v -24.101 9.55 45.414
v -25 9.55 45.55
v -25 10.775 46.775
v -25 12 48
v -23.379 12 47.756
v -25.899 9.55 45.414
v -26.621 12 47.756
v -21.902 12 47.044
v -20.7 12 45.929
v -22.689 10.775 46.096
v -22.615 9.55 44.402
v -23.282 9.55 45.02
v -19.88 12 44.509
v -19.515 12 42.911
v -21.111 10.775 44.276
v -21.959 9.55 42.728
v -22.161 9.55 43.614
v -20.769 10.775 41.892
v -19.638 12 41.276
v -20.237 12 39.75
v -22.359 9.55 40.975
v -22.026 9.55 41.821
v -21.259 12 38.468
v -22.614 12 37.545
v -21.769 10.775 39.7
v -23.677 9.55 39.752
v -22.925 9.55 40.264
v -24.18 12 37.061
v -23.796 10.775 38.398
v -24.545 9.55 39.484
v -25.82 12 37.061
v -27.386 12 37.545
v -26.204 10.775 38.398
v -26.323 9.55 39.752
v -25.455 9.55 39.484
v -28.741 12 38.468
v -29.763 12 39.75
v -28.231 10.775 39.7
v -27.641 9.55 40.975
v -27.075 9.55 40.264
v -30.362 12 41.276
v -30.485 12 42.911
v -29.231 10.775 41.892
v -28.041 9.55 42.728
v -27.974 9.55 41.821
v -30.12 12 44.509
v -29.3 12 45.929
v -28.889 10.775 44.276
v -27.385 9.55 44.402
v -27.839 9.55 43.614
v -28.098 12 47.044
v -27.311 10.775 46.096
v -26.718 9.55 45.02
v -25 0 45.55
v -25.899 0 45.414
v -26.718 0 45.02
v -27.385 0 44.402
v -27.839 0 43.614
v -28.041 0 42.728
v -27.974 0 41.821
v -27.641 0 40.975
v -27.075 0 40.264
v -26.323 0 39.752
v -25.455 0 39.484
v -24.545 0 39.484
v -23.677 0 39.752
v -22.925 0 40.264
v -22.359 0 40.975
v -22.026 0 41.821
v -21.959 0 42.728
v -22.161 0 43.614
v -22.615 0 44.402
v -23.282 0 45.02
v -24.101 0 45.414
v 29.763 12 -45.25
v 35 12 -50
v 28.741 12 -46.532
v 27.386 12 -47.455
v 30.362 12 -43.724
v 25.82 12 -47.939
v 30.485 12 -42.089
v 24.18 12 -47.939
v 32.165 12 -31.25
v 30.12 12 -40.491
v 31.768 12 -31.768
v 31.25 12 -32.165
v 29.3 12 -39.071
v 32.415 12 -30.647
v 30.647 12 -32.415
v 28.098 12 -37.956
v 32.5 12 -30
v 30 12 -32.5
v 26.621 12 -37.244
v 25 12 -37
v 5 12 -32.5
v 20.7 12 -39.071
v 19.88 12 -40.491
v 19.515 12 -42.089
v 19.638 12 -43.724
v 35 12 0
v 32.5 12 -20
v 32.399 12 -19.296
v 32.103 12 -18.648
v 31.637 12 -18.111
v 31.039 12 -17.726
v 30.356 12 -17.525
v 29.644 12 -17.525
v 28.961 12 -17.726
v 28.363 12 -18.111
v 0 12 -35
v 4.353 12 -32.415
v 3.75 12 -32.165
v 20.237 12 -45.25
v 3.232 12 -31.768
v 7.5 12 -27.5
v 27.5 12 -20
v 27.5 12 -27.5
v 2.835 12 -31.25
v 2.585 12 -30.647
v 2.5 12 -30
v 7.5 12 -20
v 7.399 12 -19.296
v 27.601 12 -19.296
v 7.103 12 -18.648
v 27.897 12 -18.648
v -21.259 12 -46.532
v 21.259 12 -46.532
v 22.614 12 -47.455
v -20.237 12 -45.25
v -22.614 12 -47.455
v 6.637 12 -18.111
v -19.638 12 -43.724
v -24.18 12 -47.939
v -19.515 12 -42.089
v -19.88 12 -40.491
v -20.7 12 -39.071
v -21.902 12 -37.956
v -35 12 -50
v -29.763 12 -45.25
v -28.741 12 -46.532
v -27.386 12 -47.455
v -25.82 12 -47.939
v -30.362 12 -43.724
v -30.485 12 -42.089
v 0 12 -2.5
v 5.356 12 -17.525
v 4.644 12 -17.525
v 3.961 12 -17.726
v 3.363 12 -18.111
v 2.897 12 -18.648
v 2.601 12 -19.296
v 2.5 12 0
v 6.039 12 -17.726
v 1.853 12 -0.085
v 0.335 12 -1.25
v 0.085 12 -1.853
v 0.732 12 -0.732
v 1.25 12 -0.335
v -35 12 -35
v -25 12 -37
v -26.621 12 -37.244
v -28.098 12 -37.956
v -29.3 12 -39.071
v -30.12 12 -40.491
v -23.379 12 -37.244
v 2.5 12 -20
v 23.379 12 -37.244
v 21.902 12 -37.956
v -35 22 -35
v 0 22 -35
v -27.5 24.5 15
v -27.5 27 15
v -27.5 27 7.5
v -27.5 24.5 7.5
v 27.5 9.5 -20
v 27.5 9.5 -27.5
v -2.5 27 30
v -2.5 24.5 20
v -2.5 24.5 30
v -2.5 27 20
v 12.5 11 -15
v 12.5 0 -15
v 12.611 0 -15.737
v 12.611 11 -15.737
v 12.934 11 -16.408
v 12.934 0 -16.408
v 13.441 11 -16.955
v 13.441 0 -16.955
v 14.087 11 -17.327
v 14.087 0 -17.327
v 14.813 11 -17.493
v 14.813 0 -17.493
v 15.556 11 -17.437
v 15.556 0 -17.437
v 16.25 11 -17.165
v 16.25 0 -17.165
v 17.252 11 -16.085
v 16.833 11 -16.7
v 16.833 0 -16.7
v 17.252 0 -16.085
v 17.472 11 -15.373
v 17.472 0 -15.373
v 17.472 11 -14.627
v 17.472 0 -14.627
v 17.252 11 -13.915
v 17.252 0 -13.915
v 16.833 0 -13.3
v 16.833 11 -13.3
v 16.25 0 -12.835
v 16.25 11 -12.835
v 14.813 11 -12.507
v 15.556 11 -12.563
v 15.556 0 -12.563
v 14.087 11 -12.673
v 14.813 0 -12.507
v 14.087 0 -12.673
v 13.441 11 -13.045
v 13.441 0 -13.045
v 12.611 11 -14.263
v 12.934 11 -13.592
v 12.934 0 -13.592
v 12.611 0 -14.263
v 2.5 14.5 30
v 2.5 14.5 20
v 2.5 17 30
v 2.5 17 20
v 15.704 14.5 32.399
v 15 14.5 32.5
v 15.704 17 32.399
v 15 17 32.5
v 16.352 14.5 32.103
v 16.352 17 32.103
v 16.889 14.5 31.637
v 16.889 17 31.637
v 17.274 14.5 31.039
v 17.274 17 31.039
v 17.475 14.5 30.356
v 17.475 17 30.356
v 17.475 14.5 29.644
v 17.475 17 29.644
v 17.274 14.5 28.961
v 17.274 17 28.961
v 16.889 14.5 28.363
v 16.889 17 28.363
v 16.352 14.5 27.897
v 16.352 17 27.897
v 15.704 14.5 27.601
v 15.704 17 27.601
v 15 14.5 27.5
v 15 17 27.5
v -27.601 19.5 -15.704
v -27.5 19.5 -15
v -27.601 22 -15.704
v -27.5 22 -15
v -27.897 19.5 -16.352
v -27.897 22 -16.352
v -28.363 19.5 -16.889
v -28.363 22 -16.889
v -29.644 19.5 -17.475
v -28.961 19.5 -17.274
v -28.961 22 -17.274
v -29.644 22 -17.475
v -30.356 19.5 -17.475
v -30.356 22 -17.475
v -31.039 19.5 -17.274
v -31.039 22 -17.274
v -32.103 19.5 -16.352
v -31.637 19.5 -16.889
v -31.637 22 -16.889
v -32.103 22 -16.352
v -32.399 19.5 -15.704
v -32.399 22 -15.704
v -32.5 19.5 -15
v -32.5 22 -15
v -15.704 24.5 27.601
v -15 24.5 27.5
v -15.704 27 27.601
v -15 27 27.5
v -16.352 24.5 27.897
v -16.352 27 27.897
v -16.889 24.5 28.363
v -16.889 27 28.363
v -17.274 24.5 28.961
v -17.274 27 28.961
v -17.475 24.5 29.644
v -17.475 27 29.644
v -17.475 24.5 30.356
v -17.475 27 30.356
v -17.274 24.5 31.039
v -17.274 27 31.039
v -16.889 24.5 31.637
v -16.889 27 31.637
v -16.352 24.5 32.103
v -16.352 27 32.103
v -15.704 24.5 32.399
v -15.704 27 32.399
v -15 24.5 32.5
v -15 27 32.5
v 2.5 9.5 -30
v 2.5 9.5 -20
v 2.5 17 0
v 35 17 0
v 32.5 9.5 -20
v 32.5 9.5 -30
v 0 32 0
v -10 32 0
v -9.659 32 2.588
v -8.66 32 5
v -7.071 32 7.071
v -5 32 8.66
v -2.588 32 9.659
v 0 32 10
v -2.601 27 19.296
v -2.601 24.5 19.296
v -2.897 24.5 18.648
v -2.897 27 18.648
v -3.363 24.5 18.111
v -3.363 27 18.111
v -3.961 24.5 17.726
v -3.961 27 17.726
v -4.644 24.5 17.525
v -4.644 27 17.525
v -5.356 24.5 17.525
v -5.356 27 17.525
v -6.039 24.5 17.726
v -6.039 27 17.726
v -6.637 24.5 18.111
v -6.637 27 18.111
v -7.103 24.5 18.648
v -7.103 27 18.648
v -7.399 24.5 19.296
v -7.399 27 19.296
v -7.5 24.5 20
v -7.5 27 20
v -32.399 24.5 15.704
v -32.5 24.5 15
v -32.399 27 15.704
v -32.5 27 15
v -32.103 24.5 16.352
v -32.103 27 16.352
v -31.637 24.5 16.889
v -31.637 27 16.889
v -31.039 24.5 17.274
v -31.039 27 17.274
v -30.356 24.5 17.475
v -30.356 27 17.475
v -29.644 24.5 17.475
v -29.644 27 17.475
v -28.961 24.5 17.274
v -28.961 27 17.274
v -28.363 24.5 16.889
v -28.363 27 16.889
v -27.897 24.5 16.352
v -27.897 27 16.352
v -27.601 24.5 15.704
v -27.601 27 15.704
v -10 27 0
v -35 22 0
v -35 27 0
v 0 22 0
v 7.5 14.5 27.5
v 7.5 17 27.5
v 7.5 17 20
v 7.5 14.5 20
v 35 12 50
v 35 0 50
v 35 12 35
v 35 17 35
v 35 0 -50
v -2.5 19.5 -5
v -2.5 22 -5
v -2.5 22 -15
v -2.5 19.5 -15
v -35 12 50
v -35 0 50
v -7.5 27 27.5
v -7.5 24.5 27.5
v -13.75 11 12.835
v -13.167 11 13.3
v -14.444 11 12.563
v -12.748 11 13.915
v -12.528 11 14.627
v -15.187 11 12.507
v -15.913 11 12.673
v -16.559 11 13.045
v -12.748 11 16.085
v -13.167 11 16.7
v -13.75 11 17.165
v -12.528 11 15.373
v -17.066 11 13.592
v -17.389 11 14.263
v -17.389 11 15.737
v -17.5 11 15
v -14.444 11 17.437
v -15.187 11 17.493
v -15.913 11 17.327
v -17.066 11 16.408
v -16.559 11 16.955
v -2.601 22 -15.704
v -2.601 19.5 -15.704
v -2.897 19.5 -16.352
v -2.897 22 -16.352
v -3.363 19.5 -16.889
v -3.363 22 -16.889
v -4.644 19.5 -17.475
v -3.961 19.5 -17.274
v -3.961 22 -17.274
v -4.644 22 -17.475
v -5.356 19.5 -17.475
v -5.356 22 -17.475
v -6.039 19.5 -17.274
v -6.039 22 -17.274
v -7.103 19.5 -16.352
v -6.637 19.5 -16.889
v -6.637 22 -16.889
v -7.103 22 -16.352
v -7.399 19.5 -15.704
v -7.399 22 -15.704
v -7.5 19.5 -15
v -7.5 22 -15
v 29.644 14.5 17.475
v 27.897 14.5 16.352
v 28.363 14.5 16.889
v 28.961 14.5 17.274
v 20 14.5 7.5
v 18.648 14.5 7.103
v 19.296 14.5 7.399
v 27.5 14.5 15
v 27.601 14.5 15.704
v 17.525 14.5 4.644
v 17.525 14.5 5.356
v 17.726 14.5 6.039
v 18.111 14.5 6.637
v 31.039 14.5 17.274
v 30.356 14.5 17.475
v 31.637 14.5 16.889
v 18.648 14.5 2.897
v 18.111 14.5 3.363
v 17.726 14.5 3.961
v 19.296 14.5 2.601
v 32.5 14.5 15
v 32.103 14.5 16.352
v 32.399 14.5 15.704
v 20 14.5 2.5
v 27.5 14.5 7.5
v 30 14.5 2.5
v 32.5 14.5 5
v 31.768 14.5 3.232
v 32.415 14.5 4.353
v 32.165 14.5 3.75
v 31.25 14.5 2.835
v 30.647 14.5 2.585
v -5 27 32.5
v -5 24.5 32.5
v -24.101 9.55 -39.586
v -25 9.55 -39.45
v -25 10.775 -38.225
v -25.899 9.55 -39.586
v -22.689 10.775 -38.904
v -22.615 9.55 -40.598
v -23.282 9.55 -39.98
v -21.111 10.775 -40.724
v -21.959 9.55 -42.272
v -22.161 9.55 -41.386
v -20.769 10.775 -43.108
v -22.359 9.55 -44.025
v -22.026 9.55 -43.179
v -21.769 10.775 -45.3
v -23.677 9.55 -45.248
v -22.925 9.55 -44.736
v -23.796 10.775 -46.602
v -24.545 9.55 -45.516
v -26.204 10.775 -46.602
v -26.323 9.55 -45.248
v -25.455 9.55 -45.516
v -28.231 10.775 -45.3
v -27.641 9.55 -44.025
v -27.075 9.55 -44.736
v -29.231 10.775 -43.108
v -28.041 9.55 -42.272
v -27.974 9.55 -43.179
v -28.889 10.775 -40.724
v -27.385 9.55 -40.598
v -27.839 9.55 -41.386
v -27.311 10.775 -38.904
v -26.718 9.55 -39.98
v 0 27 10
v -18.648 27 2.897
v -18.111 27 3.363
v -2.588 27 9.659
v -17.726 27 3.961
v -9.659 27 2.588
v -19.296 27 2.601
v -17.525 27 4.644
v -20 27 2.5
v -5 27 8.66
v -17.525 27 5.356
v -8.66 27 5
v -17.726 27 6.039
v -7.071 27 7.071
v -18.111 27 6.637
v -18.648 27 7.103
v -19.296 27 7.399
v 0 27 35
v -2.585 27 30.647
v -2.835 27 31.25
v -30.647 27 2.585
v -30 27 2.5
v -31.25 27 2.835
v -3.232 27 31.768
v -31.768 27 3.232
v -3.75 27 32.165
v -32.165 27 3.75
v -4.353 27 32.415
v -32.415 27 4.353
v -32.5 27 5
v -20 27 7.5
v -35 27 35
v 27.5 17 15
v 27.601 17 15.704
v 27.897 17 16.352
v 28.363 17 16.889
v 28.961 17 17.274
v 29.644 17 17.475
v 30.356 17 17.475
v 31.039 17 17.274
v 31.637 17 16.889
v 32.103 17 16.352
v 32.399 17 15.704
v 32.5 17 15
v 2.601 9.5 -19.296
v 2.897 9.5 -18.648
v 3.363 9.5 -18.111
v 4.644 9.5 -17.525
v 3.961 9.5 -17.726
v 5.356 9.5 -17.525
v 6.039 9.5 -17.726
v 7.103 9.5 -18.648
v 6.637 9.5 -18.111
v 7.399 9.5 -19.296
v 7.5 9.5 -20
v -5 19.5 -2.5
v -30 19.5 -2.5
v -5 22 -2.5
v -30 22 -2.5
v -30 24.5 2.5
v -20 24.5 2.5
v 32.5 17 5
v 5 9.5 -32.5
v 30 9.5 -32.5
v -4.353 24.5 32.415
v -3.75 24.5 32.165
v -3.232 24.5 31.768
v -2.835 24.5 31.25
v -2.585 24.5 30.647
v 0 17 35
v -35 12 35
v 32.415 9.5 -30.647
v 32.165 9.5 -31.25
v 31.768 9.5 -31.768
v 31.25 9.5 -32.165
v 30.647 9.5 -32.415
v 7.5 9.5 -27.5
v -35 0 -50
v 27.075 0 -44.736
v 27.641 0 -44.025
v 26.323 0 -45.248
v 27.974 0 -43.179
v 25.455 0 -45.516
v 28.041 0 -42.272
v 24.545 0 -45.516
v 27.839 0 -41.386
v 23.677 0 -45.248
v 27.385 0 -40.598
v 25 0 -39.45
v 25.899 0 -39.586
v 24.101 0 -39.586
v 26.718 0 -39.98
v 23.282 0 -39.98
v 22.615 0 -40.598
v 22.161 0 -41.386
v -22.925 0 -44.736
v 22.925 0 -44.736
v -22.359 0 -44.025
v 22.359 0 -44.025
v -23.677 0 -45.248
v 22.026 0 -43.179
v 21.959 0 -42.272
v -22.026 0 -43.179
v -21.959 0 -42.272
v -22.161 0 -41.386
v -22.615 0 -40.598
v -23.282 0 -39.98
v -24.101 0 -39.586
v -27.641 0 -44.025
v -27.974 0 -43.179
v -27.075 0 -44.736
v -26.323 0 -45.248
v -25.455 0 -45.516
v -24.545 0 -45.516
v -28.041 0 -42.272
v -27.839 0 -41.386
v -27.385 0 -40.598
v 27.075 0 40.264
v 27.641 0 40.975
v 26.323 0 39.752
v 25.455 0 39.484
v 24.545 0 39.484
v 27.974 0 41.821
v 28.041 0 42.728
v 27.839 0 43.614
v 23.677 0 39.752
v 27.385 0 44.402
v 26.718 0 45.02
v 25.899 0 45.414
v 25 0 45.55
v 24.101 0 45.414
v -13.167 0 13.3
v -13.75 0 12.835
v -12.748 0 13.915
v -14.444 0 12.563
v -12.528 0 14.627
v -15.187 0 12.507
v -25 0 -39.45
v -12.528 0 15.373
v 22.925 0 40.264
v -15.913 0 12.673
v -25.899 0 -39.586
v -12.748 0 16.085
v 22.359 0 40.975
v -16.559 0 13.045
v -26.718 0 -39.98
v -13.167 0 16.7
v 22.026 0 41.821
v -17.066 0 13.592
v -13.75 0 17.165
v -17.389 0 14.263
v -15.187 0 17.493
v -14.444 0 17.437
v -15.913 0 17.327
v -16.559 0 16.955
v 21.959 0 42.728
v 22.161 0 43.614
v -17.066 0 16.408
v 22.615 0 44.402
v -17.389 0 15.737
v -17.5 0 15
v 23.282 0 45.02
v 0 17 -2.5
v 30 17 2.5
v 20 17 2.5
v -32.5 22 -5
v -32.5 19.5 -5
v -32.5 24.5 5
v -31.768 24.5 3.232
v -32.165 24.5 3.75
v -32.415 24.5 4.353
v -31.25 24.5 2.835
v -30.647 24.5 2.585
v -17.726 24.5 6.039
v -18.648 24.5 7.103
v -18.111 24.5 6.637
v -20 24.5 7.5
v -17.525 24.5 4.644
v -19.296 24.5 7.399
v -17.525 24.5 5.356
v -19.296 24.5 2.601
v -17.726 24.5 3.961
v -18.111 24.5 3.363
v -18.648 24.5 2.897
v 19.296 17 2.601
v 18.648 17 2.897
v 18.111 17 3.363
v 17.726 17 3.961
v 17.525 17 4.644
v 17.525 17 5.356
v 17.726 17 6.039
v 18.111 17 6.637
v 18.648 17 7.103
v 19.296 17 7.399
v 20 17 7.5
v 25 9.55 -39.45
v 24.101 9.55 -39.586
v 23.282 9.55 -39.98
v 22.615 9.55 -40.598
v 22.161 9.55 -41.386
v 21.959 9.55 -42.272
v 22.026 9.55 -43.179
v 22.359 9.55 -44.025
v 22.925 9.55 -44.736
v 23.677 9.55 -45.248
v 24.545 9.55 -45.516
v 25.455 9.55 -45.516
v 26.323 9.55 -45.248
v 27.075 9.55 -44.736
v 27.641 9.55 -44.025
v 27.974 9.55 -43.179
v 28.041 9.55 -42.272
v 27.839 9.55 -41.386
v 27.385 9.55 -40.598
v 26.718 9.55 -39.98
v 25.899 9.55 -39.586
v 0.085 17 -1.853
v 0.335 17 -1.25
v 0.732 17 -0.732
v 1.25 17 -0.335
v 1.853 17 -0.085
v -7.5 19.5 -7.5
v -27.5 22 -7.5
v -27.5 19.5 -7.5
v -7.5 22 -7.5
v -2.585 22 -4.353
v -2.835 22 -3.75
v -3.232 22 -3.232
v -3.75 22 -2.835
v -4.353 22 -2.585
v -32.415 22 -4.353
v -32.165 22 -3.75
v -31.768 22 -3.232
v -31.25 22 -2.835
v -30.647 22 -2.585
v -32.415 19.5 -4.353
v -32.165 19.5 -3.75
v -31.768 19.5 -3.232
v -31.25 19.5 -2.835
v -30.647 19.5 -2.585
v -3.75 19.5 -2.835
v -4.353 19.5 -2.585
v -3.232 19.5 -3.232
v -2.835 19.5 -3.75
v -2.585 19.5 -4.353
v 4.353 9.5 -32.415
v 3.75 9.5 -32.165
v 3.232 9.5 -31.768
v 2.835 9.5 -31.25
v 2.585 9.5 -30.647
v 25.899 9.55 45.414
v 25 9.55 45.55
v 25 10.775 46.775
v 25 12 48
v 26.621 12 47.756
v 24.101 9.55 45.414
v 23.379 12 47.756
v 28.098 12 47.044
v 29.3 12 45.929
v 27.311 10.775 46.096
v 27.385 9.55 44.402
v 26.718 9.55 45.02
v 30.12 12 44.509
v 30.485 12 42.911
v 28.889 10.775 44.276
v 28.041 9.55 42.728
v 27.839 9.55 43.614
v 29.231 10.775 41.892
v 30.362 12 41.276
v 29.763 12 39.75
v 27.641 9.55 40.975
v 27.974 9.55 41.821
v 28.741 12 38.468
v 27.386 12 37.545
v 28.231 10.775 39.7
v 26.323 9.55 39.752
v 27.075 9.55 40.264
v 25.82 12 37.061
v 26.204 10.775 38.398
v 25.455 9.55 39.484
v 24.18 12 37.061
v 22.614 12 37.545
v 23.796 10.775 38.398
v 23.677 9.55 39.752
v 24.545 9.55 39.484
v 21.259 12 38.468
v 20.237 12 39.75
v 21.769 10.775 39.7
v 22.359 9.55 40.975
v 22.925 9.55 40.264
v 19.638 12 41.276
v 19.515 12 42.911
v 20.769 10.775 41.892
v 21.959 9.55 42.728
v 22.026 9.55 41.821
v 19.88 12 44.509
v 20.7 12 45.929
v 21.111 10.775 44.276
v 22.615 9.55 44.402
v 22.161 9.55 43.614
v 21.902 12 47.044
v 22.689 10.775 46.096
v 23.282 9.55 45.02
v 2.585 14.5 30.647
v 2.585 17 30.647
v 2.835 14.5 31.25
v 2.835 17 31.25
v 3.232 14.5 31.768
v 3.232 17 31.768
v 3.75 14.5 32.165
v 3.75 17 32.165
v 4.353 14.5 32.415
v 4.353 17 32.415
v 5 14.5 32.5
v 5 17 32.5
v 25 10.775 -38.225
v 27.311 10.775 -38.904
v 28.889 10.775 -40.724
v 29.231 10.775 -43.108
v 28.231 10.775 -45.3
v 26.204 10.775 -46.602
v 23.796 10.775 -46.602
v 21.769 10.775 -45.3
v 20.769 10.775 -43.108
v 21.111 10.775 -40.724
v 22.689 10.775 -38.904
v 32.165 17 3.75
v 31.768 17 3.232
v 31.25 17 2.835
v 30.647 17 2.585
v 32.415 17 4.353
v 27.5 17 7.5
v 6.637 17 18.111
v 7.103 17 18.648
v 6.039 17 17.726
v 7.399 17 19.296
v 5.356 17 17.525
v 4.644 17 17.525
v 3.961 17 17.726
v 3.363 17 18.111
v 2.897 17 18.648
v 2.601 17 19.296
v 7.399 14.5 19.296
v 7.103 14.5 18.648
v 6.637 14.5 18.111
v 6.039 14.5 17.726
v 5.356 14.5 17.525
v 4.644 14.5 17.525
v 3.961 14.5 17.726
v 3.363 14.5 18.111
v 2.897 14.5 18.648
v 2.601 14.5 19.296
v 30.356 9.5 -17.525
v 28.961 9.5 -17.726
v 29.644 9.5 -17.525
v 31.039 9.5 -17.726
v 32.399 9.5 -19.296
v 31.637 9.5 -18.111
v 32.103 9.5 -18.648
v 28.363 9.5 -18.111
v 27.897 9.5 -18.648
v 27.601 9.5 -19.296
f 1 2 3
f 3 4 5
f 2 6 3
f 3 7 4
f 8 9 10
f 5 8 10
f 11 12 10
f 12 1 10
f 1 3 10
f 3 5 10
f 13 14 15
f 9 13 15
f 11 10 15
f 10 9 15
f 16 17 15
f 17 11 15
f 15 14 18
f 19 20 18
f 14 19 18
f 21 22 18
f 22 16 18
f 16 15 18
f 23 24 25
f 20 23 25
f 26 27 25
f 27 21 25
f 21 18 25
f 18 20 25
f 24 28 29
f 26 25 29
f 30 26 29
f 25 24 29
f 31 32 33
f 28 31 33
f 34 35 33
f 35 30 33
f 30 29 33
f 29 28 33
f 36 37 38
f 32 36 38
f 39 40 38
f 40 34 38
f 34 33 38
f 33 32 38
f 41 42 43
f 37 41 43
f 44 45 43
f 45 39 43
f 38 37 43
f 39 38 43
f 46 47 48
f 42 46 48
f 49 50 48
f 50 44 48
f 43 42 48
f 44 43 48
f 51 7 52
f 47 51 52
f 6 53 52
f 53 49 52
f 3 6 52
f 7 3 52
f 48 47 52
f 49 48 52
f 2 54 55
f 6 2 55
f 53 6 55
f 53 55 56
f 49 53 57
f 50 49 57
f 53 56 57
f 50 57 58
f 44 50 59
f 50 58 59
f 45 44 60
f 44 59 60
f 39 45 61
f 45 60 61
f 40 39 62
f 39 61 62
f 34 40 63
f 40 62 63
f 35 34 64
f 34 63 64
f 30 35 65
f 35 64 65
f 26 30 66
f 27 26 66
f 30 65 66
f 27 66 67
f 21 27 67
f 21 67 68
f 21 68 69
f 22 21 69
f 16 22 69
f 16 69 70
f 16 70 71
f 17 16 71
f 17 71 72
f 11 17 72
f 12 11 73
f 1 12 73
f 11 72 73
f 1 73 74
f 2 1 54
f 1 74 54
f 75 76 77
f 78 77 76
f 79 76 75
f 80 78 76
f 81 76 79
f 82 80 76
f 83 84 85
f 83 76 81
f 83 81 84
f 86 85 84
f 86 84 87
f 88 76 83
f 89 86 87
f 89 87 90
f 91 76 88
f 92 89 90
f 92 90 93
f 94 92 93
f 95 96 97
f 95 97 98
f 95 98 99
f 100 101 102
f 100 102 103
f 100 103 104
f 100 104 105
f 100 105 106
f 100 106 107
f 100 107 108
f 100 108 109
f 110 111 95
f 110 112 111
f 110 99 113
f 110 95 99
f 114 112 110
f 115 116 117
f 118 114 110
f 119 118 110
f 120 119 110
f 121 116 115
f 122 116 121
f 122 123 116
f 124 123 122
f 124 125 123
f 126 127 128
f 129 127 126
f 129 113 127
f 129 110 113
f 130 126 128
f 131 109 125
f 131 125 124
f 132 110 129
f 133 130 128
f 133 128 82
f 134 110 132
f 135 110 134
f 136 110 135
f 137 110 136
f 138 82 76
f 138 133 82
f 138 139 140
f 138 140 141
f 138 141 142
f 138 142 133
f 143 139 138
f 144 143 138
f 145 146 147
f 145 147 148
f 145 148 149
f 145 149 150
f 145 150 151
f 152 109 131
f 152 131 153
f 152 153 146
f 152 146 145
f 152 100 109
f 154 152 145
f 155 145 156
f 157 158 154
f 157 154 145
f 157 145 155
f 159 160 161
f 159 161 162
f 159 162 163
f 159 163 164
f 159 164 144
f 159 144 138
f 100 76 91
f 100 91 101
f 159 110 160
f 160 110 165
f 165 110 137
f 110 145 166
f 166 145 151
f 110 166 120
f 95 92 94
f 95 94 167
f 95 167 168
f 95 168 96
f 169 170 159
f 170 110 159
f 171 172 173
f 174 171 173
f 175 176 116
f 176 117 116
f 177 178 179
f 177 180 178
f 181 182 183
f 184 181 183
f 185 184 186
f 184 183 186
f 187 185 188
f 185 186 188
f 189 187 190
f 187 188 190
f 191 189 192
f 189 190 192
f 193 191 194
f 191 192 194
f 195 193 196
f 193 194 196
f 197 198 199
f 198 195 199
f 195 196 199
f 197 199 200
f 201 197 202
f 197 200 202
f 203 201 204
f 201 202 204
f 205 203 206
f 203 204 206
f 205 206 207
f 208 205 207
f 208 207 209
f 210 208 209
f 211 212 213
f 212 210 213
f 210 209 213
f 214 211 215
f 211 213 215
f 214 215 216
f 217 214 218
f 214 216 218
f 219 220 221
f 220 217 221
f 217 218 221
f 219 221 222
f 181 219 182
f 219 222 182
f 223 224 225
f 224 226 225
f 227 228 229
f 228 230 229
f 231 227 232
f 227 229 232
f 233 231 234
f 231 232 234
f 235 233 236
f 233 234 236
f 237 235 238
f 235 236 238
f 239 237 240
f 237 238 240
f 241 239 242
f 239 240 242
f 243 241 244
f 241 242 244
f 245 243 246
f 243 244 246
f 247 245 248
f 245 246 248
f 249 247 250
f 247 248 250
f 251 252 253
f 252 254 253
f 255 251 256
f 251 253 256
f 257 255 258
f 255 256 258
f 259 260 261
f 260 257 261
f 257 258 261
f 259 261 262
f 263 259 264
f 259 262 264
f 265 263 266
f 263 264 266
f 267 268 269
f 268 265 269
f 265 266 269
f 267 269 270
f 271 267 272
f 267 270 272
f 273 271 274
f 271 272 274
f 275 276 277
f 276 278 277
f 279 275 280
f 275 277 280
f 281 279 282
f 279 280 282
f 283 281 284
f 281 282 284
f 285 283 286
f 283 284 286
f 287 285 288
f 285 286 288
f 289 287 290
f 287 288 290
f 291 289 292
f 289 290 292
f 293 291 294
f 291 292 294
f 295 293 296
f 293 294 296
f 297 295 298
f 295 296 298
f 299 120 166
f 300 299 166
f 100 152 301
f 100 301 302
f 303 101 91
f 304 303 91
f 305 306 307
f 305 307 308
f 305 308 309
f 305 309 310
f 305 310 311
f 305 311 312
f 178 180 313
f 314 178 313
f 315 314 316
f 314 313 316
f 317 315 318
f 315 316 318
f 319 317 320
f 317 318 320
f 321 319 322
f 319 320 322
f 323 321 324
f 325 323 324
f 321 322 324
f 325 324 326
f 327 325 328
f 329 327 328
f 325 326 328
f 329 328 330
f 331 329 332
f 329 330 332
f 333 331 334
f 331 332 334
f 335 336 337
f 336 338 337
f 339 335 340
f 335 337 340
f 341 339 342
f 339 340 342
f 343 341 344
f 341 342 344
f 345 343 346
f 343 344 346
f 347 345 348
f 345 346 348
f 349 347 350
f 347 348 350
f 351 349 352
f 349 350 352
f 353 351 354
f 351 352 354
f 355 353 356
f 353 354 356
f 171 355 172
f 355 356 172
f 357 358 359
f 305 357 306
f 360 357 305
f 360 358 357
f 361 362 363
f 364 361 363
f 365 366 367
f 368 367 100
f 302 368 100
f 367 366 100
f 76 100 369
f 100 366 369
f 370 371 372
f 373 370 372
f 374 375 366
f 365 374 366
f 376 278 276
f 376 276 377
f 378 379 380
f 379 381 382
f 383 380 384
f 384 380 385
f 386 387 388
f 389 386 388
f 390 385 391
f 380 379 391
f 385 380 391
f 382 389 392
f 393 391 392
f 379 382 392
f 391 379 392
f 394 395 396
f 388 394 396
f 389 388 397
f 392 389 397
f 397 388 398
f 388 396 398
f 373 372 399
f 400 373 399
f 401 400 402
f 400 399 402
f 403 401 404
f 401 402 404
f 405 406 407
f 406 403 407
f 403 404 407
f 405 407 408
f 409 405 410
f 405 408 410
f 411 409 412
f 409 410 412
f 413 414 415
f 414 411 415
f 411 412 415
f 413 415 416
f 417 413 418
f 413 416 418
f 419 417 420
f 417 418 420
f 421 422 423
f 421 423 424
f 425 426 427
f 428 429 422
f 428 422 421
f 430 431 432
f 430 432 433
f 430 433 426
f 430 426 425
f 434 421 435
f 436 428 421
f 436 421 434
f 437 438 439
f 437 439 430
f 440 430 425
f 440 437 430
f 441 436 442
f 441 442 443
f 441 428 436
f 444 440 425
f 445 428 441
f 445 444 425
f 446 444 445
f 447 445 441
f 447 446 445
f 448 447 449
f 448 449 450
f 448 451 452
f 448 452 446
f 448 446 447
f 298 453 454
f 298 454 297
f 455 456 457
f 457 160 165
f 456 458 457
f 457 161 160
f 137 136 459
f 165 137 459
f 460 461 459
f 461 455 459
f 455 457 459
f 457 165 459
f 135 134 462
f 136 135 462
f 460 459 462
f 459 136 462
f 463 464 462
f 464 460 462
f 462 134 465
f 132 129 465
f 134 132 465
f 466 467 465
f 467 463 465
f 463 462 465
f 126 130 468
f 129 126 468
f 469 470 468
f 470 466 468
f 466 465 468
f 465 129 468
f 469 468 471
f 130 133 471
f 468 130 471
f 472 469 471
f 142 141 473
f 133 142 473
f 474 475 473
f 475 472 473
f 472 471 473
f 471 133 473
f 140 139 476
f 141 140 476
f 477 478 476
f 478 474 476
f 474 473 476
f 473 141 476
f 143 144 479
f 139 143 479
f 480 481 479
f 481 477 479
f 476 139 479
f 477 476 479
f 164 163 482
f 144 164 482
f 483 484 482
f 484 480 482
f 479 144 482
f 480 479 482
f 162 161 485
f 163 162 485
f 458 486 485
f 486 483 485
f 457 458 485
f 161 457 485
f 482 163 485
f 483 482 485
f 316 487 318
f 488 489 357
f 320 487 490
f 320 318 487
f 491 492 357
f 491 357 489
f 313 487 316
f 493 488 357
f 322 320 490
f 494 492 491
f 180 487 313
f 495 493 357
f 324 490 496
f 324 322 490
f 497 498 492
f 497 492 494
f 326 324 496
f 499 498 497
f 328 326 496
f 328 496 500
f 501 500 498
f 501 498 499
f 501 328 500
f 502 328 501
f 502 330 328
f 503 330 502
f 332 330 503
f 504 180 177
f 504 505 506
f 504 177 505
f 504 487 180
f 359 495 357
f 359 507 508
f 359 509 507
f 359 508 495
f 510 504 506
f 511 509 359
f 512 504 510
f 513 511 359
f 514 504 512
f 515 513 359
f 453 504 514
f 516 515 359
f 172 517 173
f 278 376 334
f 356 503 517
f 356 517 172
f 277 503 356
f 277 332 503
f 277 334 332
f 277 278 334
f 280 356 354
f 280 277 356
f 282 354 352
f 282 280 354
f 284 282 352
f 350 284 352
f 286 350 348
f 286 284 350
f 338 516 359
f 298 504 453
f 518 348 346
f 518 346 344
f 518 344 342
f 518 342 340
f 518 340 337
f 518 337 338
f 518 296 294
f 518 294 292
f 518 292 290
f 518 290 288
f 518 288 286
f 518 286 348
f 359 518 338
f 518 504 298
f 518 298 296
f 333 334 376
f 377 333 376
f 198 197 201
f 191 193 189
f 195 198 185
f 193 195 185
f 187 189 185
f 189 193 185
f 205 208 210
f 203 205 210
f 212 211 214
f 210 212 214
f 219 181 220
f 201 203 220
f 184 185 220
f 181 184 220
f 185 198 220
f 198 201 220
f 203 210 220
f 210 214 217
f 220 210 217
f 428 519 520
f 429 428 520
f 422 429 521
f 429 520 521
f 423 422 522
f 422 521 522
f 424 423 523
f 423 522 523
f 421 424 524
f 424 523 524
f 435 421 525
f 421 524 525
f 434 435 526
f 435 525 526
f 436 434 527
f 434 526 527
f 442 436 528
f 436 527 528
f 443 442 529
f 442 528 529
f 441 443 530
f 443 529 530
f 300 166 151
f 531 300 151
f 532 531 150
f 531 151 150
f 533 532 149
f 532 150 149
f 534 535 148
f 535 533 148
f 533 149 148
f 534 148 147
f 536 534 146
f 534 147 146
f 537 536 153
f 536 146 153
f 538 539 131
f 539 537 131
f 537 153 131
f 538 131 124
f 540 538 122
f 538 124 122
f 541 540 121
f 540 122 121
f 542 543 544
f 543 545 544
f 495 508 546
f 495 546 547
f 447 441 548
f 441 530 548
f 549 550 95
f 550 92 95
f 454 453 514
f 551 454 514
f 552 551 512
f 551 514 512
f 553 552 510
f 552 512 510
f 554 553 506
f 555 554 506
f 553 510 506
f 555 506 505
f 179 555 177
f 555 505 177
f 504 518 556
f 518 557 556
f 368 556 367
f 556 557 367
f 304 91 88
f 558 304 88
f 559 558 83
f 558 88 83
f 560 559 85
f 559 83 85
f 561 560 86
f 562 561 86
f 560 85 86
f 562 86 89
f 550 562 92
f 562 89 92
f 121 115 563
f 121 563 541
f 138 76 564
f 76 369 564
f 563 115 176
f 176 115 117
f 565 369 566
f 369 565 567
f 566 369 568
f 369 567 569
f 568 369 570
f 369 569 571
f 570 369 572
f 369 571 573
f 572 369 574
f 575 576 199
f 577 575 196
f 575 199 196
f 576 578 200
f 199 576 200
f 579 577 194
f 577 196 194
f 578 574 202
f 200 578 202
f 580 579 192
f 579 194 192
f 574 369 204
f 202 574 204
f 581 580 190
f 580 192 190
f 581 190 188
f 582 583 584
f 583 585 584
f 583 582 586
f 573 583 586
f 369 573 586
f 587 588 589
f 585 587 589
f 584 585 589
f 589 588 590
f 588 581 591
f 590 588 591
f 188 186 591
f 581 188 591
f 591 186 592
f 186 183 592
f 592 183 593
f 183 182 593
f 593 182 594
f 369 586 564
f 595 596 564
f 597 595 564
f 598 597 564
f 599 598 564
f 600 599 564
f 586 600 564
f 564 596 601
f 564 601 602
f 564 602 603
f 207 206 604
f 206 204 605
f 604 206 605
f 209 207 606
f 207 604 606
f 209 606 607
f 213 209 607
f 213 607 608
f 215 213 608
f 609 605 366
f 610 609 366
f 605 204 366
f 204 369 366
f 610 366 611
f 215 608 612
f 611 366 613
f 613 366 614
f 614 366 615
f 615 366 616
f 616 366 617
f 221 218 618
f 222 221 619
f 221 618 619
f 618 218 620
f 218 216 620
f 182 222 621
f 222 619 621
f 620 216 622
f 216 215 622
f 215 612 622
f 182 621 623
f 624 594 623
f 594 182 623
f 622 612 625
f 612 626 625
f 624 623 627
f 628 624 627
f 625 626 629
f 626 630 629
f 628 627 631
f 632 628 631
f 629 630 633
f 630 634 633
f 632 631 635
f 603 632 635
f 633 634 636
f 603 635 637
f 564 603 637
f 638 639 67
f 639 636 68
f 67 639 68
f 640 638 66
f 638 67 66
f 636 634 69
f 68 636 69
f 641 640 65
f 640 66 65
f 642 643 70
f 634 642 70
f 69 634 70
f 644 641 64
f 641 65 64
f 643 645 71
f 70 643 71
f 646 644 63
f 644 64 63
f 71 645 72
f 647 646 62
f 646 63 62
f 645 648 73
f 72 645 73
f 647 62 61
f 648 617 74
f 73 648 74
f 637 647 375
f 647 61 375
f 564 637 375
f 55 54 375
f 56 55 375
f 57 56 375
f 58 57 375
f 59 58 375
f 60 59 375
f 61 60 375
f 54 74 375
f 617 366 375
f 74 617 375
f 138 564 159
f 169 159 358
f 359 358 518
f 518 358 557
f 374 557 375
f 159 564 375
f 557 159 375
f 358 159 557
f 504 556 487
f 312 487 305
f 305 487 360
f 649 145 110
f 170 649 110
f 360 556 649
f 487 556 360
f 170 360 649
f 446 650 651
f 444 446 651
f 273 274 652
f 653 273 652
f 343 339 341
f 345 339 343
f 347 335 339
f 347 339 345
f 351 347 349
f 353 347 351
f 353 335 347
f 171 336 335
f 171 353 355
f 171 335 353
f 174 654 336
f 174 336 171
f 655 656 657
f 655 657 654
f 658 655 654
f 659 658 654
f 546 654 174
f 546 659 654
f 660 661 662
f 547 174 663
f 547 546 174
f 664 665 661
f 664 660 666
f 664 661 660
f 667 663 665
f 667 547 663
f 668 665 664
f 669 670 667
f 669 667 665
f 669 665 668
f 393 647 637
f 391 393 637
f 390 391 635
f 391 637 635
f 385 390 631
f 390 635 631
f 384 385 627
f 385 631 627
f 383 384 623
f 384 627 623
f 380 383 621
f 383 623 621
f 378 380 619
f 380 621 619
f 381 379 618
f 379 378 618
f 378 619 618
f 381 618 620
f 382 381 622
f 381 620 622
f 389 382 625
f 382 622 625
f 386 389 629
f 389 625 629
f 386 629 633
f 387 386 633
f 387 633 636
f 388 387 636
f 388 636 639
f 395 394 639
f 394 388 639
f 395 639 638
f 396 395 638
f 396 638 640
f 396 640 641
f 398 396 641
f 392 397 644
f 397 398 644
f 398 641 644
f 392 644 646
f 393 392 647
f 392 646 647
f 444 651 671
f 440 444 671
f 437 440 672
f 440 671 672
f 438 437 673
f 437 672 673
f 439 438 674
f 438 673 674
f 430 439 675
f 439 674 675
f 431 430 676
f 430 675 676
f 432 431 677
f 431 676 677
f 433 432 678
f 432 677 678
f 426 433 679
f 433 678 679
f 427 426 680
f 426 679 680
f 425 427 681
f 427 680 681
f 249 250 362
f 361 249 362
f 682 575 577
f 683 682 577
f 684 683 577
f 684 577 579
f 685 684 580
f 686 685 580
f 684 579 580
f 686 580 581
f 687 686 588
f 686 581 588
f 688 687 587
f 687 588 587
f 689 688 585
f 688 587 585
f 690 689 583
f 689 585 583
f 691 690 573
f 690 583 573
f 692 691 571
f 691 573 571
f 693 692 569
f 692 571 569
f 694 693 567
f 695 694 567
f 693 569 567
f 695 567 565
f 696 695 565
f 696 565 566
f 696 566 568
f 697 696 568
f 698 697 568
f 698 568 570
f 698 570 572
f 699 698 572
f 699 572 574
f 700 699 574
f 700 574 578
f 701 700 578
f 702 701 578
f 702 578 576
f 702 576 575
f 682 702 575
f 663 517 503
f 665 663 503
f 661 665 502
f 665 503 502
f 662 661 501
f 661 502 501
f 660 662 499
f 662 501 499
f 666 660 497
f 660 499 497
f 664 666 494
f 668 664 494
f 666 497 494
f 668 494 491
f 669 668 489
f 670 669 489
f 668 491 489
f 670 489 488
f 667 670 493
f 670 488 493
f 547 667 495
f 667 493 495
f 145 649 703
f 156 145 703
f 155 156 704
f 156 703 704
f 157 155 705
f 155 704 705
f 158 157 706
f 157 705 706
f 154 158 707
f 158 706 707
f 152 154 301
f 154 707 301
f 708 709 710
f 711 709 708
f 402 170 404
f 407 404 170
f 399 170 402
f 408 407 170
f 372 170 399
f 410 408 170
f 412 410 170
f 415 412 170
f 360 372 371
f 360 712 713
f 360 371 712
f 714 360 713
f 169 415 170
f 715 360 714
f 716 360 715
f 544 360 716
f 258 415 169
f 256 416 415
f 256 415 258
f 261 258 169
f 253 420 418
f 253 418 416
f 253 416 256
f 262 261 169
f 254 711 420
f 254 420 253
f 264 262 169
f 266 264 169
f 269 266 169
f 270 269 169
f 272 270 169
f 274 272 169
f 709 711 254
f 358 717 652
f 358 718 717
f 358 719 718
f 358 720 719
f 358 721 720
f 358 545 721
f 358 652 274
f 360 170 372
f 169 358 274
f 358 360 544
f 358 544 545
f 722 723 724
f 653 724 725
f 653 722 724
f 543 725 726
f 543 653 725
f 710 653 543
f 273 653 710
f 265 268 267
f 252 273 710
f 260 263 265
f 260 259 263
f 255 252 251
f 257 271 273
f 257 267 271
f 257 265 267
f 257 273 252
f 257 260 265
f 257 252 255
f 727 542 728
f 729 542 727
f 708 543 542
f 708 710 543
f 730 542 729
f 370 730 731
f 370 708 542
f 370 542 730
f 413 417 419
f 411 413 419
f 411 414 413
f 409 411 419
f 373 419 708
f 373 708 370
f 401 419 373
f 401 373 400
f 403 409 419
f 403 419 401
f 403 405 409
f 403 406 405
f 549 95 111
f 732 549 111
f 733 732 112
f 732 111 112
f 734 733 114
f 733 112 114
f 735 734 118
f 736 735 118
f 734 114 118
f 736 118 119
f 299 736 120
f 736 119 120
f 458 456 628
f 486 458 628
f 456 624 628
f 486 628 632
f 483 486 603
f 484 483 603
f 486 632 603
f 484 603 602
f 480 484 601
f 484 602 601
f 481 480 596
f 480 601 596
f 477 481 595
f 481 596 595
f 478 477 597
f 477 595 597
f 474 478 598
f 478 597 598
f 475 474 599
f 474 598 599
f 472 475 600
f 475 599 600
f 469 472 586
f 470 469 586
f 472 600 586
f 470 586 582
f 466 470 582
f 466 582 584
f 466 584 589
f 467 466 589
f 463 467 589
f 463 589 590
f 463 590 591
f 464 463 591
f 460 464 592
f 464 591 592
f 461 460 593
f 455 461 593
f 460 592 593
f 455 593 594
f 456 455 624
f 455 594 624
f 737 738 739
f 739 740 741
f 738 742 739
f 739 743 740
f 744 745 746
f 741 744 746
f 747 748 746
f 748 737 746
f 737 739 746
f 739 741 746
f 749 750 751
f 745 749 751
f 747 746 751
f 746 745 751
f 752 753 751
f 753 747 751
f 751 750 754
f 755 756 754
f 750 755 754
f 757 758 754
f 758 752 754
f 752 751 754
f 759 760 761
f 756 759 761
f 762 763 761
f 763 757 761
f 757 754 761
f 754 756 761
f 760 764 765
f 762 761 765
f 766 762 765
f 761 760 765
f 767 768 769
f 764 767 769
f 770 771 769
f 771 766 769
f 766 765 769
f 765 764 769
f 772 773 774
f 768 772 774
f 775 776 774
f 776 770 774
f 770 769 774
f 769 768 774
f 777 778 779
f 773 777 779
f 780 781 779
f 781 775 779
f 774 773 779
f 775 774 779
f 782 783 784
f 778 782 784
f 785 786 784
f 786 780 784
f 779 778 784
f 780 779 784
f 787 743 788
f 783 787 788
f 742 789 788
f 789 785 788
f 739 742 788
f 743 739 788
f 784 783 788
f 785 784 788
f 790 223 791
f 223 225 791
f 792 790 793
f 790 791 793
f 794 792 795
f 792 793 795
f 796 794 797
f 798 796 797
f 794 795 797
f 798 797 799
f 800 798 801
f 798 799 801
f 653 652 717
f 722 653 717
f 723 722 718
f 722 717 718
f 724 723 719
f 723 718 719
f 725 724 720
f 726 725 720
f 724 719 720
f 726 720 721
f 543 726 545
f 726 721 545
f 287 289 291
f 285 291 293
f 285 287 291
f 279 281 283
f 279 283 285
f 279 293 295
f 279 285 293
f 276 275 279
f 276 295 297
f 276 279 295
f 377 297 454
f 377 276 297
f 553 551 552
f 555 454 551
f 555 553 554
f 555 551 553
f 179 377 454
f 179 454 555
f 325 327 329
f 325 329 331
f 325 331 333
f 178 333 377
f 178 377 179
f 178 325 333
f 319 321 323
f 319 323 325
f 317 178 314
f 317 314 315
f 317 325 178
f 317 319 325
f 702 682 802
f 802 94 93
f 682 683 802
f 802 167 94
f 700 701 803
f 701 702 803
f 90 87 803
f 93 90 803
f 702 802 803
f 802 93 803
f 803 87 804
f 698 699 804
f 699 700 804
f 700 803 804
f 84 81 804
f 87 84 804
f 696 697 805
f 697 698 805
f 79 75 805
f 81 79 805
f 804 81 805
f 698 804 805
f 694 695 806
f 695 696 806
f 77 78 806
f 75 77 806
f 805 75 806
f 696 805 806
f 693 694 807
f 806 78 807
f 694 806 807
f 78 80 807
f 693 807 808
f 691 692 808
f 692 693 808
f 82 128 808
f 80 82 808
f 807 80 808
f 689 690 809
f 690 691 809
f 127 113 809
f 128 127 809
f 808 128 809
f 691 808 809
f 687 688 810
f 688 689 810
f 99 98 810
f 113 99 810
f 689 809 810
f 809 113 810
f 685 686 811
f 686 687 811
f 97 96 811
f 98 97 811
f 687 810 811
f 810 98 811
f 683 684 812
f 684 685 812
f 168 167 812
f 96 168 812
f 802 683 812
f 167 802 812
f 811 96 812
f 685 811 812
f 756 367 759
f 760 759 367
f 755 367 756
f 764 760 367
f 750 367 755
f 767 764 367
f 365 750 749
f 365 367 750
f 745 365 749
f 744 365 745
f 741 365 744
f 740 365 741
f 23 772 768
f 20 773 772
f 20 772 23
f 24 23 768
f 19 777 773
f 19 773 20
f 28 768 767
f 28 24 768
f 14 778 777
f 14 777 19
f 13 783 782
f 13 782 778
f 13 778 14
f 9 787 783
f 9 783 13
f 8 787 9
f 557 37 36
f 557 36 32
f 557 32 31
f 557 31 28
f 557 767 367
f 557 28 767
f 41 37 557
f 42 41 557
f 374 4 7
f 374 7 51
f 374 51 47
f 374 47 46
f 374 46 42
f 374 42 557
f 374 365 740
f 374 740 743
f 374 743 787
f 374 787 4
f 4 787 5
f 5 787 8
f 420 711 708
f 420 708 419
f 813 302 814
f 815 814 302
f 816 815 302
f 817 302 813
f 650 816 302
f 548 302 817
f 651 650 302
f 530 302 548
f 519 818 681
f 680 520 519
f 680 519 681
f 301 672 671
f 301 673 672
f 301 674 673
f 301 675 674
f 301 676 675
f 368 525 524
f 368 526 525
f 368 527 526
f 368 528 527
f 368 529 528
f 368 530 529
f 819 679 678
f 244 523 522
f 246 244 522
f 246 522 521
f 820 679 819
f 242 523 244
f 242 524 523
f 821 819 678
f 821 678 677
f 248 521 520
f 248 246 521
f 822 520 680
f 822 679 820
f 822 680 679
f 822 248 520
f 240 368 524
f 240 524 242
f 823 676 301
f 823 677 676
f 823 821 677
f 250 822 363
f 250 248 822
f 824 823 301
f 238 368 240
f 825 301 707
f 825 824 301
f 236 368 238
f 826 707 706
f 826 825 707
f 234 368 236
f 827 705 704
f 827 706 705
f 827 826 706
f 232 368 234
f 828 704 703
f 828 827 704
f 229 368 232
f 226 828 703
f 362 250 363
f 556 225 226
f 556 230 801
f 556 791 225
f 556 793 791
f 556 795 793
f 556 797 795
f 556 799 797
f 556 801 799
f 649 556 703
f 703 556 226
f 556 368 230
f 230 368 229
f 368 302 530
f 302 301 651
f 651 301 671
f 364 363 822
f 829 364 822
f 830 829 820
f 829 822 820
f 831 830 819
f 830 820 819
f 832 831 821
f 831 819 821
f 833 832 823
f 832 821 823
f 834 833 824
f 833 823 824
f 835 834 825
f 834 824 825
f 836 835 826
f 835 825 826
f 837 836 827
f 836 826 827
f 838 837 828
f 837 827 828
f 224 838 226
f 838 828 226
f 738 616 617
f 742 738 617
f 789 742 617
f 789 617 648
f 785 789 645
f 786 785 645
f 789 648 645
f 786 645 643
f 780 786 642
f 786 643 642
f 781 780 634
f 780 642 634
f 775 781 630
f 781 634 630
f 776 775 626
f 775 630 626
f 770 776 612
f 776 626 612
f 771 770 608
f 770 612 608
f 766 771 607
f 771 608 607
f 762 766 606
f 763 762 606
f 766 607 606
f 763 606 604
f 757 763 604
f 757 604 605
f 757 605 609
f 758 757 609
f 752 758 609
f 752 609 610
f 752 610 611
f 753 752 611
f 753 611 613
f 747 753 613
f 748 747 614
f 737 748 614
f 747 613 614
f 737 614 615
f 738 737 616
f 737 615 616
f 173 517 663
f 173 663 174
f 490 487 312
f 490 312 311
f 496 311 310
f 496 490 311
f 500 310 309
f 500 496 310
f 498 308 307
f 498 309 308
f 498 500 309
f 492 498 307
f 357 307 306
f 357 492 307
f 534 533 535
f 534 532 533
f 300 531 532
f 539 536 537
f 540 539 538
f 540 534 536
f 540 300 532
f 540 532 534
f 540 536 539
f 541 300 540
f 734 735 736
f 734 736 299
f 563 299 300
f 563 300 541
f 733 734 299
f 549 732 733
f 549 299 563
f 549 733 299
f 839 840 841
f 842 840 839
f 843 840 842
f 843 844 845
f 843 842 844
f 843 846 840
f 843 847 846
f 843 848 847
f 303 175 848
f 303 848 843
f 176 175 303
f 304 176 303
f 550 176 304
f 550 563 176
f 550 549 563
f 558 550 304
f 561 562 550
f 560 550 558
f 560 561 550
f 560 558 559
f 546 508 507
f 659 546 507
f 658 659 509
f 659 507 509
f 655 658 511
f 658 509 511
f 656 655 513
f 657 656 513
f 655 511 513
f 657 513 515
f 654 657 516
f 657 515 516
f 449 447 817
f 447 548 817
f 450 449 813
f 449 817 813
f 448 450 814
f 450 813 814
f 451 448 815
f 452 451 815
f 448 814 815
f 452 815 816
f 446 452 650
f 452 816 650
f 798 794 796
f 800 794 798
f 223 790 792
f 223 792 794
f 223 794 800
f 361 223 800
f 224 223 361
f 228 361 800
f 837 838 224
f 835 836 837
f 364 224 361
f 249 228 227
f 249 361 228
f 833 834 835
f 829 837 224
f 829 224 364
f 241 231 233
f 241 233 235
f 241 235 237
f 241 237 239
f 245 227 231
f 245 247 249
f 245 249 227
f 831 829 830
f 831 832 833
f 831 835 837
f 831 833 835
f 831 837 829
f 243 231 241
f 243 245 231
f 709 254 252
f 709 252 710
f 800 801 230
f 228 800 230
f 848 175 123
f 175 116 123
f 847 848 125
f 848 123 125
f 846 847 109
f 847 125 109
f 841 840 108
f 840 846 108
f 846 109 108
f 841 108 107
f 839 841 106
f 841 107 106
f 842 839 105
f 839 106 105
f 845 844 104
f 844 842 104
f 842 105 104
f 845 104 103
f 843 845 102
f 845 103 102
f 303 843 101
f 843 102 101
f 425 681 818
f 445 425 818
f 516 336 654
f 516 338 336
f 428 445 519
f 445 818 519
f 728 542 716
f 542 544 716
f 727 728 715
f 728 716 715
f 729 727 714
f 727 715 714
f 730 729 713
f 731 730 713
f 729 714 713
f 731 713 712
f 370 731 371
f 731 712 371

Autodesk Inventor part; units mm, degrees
ref_plane "YZ Plane" through (0, 0, 0) normal (1, 0, 0) x (0, 1, 0)
ref_plane "XZ Plane" through (0, 0, 0) normal (0, 1, 0) x (-1, 0, 0)
ref_plane "XY Plane" through (0, 0, 0) normal (0, 0, 1) x (1, 0, 0)
sketch "Sketch1" plane through (0, 0, 0) normal (0, 1, 0) x (-1, 0, 0)
  line L0 (35, 50) -> (-35, 50)
  line L1 (-35, 50) -> (-35, -50)
  line L2 (-35, -50) -> (35, -50)
  line L3 (35, -50) -> (35, 50)
  line L4 (35, 50) -> (-35, -50) construction
  line L5 (-35, 50) -> (35, -50) construction
  line L6 (35, 35) -> (-35, 35)
  line L7 (-35, 35) -> (-35, -35)
  line L8 (-35, -35) -> (35, -35)
  line L9 (35, -35) -> (35, 35)
  line L10 (35, 35) -> (-35, -35) construction
  line L11 (-35, 35) -> (35, -35) construction
  line L12 (0, 35) -> (0, -35)
  line L13 (35, 0) -> (-35, 0)
  line L14 (0, 0) -> (0, 15) construction
  line L15 (0, 15) -> (15, 15) construction
  line L16 (0, 0) -> (0, -15) construction
  line L17 (0, -15) -> (-15, -15) construction
  circle A0 centre (15, 15) radius 2.5
  circle A1 centre (-15, -15) radius 2.5
  dimension "d0" = 70
  dimension "d1" = 100
  dimension "d2" = 70
  dimension "d3" = 70
  dimension "d46" = 15
  dimension "d47" = 15
  dimension "d48" = 15
  dimension "d49" = 5
  dimension "d50" = 5
extrude "Extrusion1" add sketch "Sketch1" along normal blind 12 contours L3 L6 L1 L0 | L13 L12 L8 L1 | L3 L2 L1 L8 | A1
extrude "Extrusion2" add sketch "Sketch1" along normal blind 17 contours L6 L12 L13 L1
extrude "Extrusion3" add sketch "Sketch1" along normal blind 22 contours L3 L8 L12 L13
extrude "Extrusion4" add sketch "Sketch1" along normal blind 27 contours L3 L13 L12 L6 | A0
sketch "Sketch2" plane through (0, 27, 0) normal (0, 1, 0) x (1, 0, 0)
  line L0 (35, -35) -> (-35, -35) construction
  line L1 (35, 0) -> (0, 0) construction
  line L2 (-35, -35) -> (0, -35) construction
  line L3 (0, -35) -> (0, 0) construction
  line L4 (0, 0) -> (-35, 0) construction
  line L5 (-35, 0) -> (-35, -35) construction
  line L6 (0, -35) -> (-35, 0) construction
  line L7 (0, 0) -> (-35, -35) construction
  line L8 (-5, -32.5) -> (-15, -32.5)
  line L9 (-32.5, -15) -> (-32.5, -5)
  line L10 (-30, -2.5) -> (-20, -2.5)
  line L11 (-2.5, -20) -> (-2.5, -30)
  line L12 (-2.5, -32.5) -> (-32.5, -2.5) construction
  line L13 (-32.5, -32.5) -> (-2.5, -2.5) construction
  line L14 (-15, -27.5) -> (-10, -27.5)
  line L15 (-7.5, -25) -> (-7.5, -20)
  line L16 (-20, -7.5) -> (-25, -7.5)
  line L17 (-27.5, -10) -> (-27.5, -15)
  line L18 (-27.5, -27.5) -> (-7.5, -7.5) construction
  line L19 (-7.5, -27.5) -> (-27.5, -7.5) construction
  line L20 (-5, -17.5) -> (-5, -17.5)
  line L21 (-17.5, -30) -> (-17.5, -30)
  line L22 (-30, -17.5) -> (-30, -17.5)
  line L23 (-17.5, -5) -> (-17.5, -5)
  arc A0 (-17.5, -30) -> (-15, -32.5) centre (-15, -30) ccw
  arc A1 (-15, -27.5) -> (-17.5, -30) centre (-15, -30) ccw
  arc A2 (-5, -17.5) -> (-7.5, -20) centre (-5, -20) ccw
  arc A3 (-2.5, -20) -> (-5, -17.5) centre (-5, -20) ccw
  arc A4 (-5, -32.5) -> (-2.5, -30) centre (-5, -30) ccw
  arc A5 (-32.5, -15) -> (-30, -17.5) centre (-30, -15) ccw
  arc A6 (-30, -17.5) -> (-27.5, -15) centre (-30, -15) ccw
  arc A7 (-20, -7.5) -> (-17.5, -5) centre (-20, -5) ccw
  arc A8 (-17.5, -5) -> (-20, -2.5) centre (-20, -5) ccw
  arc A9 (-30, -2.5) -> (-32.5, -5) centre (-30, -5) ccw
  line L24 (5, -32.5) -> (15, -32.5)
  line L25 (32.5, -15) -> (32.5, -5)
  line L26 (30, -2.5) -> (20, -2.5)
  line L27 (2.5, -20) -> (2.5, -30)
  line L28 (15, -27.5) -> (10, -27.5)
  line L29 (7.5, -25) -> (7.5, -20)
  line L30 (20, -7.5) -> (25, -7.5)
  line L31 (27.5, -10) -> (27.5, -15)
  arc A10 (15, -32.5) -> (17.5, -30) centre (15, -30) ccw
  arc A11 (17.5, -30) -> (15, -27.5) centre (15, -30) ccw
  arc A12 (7.5, -20) -> (5, -17.5) centre (5, -20) ccw
  arc A13 (5, -17.5) -> (2.5, -20) centre (5, -20) ccw
  arc A14 (2.5, -30) -> (5, -32.5) centre (5, -30) ccw
  arc A15 (30, -17.5) -> (32.5, -15) centre (30, -15) ccw
  arc A16 (27.5, -15) -> (30, -17.5) centre (30, -15) ccw
  arc A17 (17.5, -5) -> (20, -7.5) centre (20, -5) ccw
  arc A18 (20, -2.5) -> (17.5, -5) centre (20, -5) ccw
  arc A19 (32.5, -5) -> (30, -2.5) centre (30, -5) ccw
  line L32 (7.5, 25) -> (7.5, 20)
  arc A20 (10, 27.5) -> (7.5, 25) centre (10, 25) ccw
  line L33 (15, 27.5) -> (10, 27.5)
  arc A21 (15, 27.5) -> (17.5, 30) centre (15, 30) ccw
  arc A22 (17.5, 30) -> (15, 32.5) centre (15, 30) ccw
  line L34 (5, 32.5) -> (15, 32.5)
  arc A23 (5, 32.5) -> (2.5, 30) centre (5, 30) ccw
  line L35 (2.5, 20) -> (2.5, 30)
  arc A24 (2.5, 20) -> (5, 17.5) centre (5, 20) ccw
  arc A25 (5, 17.5) -> (7.5, 20) centre (5, 20) ccw
  line L36 (-32.5, 15) -> (-32.5, 5)
  line L37 (-30, 2.5) -> (-20, 2.5)
  line L38 (-20, 7.5) -> (-25, 7.5)
  line L39 (-27.5, 10) -> (-27.5, 15)
  arc A26 (-30, 17.5) -> (-32.5, 15) centre (-30, 15) ccw
  arc A27 (-27.5, 15) -> (-30, 17.5) centre (-30, 15) ccw
  arc A28 (-27.5, 10) -> (-25, 7.5) centre (-25, 10) ccw
  arc A29 (-17.5, 5) -> (-20, 7.5) centre (-20, 5) ccw
  arc A30 (-20, 2.5) -> (-17.5, 5) centre (-20, 5) ccw
  arc A31 (-32.5, 5) -> (-30, 2.5) centre (-30, 5) ccw
  line L40 (-35, 50) -> (-35, 35) construction
  line L41 (35, -35) -> (35, 0) construction
  line L42 (-35, 35) -> (35, -35) construction
  line L43 (-10, -27.5) -> (-7.5, -27.5)
  line L44 (-7.5, -25) -> (-7.5, -27.5)
  line L45 (-27.5, -10) -> (-27.5, -7.5)
  line L46 (-27.5, -7.5) -> (-25, -7.5)
  line L47 (10, -27.5) -> (7.5, -27.5)
  line L48 (7.5, -27.5) -> (7.5, -25)
  line L49 (25, -7.5) -> (27.5, -7.5)
  line L50 (27.5, -7.5) -> (27.5, -10)
  point P0 (-17.5, -17.5)
  point P1 (-17.5, -17.5)
  point P2 (-7.5, -17.5)
  point P3 (-17.5, -27.5)
  point P4 (-17.5, -32.5)
  dimension "d12" = 30
  dimension "d13" = 30
  dimension "d16" = 15
  dimension "d17" = 5
  dimension "d18" = 10
  dimension "d19" = 10
  dimension "d20" = 2.5
fillet "Fillet1" radius 2.5 1 edges at (0, 14.5, 0)
extrude "Extrusion5" cut sketch "Sketch2" against normal blind 2.5 contours L8 A0 A1 L14 L43 L44 L15 A2 A3 L11 A4 | L9 A9 L10 A8 A7 L16 L46 L45 L17 A6 A5
extrude "Extrusion6" cut sketch "Sketch2" against normal blind 12.5 contours A14 L27 A13 A12 L29 L48 L47 L28 A11 A10 L24 | A15 A16 L31 L50 L49 L30 A17 A18 L26 A19 L25
sketch "Sketch3" plane through (0, 22, 0) normal (0, 1, 0) x (1, 0, 0)
  line L0 (0, 0) -> (0, 35) construction
  line L1 (-35, 50) -> (-35, -50) construction
  line L2 (0, 35) -> (-35, 35) construction
  line L3 (-35, 35) -> (-35, 0) construction
  line L4 (-35, 0) -> (0, 0) construction
  line L5 (0, 0) -> (0, 35) construction
  line L6 (-35, 35) -> (0, 0) construction
  line L7 (0, 35) -> (-35, 0) construction
  line L8 (-32.5, 15) -> (-32.5, 5)
  line L9 (-30, 2.5) -> (-5, 2.5)
  line L10 (-2.5, 5) -> (-2.5, 15)
  line L11 (-2.5, 32.5) -> (-32.5, 2.5) construction
  line L12 (-32.5, 32.5) -> (-2.5, 2.5) construction
  line L13 (-25, 7.5) -> (-10, 7.5)
  line L14 (-7.5, 10) -> (-7.5, 15)
  line L15 (-27.5, 15) -> (-27.5, 10)
  line L16 (-27.5, 7.5) -> (-7.5, 27.5) construction
  line L17 (-7.5, 7.5) -> (-27.5, 27.5) construction
  line L18 (-30, 17.5) -> (-30, 17.5)
  line L19 (-5, 17.5) -> (-5, 17.5)
  arc A0 (-30, 17.5) -> (-32.5, 15) centre (-30, 15) ccw
  arc A1 (-27.5, 15) -> (-30, 17.5) centre (-30, 15) ccw
  arc A2 (-5, 17.5) -> (-7.5, 15) centre (-5, 15) ccw
  arc A3 (-2.5, 15) -> (-5, 17.5) centre (-5, 15) ccw
  arc A4 (-5, 2.5) -> (-2.5, 5) centre (-5, 5) ccw
  arc A5 (-32.5, 5) -> (-30, 2.5) centre (-30, 5) ccw
  line L20 (35, 35) -> (0, 0) construction
  line L21 (0, 35) -> (35, 0) construction
  line L22 (32.5, 15) -> (32.5, 5)
  line L23 (30, 2.5) -> (5, 2.5)
  line L24 (2.5, 5) -> (2.5, 15)
  line L25 (2.5, 32.5) -> (32.5, 2.5) construction
  line L26 (32.5, 32.5) -> (2.5, 2.5) construction
  line L27 (25, 7.5) -> (10, 7.5)
  line L28 (7.5, 10) -> (7.5, 15)
  line L29 (27.5, 15) -> (27.5, 10)
  line L30 (27.5, 7.5) -> (7.5, 27.5) construction
  line L31 (7.5, 7.5) -> (27.5, 27.5) construction
  line L32 (30, 17.5) -> (30, 17.5)
  line L33 (5, 17.5) -> (5, 17.5)
  arc A6 (32.5, 15) -> (30, 17.5) centre (30, 15) ccw
  arc A7 (30, 17.5) -> (27.5, 15) centre (30, 15) ccw
  arc A8 (7.5, 15) -> (5, 17.5) centre (5, 15) ccw
  arc A9 (5, 17.5) -> (2.5, 15) centre (5, 15) ccw
  arc A10 (2.5, 5) -> (5, 2.5) centre (5, 5) ccw
  arc A11 (30, 2.5) -> (32.5, 5) centre (30, 5) ccw
  arc A12 (25, 7.5) -> (27.5, 10) centre (25, 10) ccw
  arc A13 (7.5, 10) -> (10, 7.5) centre (10, 10) ccw
  line L34 (0, 17.5) -> (35, 17.5) construction
  line L35 (35, 0) -> (35, 50) construction
  line L36 (2.5, 30) -> (2.5, 20)
  line L37 (27.5, 20) -> (27.5, 25)
  line L38 (35, 0) -> (0, 35) construction
  line L39 (25, 27.5) -> (10, 27.5)
  line L40 (30, 32.5) -> (5, 32.5)
  arc A14 (32.5, 30) -> (30, 32.5) centre (30, 30) ccw
  line L41 (32.5, 20) -> (32.5, 30)
  arc A15 (27.5, 20) -> (30, 17.5) centre (30, 20) ccw
  arc A16 (30, 17.5) -> (32.5, 20) centre (30, 20) ccw
  line L42 (7.5, 25) -> (7.5, 20)
  arc A17 (5, 32.5) -> (2.5, 30) centre (5, 30) ccw
  arc A18 (5, 17.5) -> (7.5, 20) centre (5, 20) ccw
  arc A19 (2.5, 20) -> (5, 17.5) centre (5, 20) ccw
  line L43 (-27.5, 10) -> (-27.5, 7.5)
  line L44 (-27.5, 7.5) -> (-25, 7.5)
  line L45 (-10, 7.5) -> (-7.5, 7.5)
  line L46 (-7.5, 7.5) -> (-7.5, 10)
  line L47 (7.5, 25) -> (7.5, 27.5)
  line L48 (7.5, 27.5) -> (10, 27.5)
  line L49 (25, 27.5) -> (27.5, 27.5)
  line L50 (27.5, 27.5) -> (27.5, 25)
  point P0 (-17.5, 17.5)
  point P1 (17.5, 17.5)
  dimension "d26" = 30
  dimension "d30" = 2.5
extrude "Extrusion7" cut sketch "Sketch3" against normal blind 2.5 contours A0 A1 L15 L43 L44 L13 L45 L46 L14 A2 A3 L10 A4 L9 A5 L8
extrude "Extrusion8" cut sketch "Sketch3" against normal blind 12.5 contours A15 L37 L50 L49 L39 L48 L47 L42 A18 A19 L36 A17 L40 A14 L41 A16
sketch "Sketch5" plane through (0, 12, 0) normal (0, 1, 0) x (1, 0, 0)
  line L0 (-35, -50) -> (35, -50) construction
  line L1 (-35, -50) -> (-35, -42.5) construction
  line L2 (-35, 50) -> (-35, -50) construction
  line L3 (-35, -42.5) -> (34.9391, -42.5) construction
  line L4 (-35, 50) -> (-35, 35) construction
  line L5 (-35, 42.5) -> (35, 42.5) construction
  line L6 (35, 0) -> (35, 50) construction
  line L7 (0, 42.5) -> (-25, 42.5) construction
  line L8 (-25, 42.5) -> (25, 42.5) construction
  line L9 (25, 42.5) -> (25, -42.5) construction
  line L10 (25, -42.5) -> (-25, -42.5) construction
  point P0 (0, 0)
  dimension "d35" = 7.5
  dimension "d36" = 25
  dimension "d37" = 50
  dimension "d38" = 50
hole "Hole1" at (-25, 12, 42.5) at (-25, 12, -42.5) at (25, 12, -42.5) at (25, 12, 42.5) direction (0, -1, 0) diameter 6.1 end through all countersink diameter 11 countersink angle 90 clearance for "Countersunk Flat Head Screw ISO 2009/7046" size "M6" standard "ISO"
sketch "Sketch6" plane through (0, 27, 0) normal (0, 1, 0) x (1, 0, 0)
  line L0 (-35, 0) -> (0, 0) projected
  arc A0 (-10, 0) -> (0, -10) centre (0, 0) ccw
  line L1 (0, -10) -> (0, 0)
  line L2 (-10, 0) -> (0, 0)
  dimension "d54" = 10
extrude "Extrusion10" add sketch "Sketch6" along normal blind 5
sketch "Sketch7" plane through (0, 0, 0) normal (0, -1, 0) x (1, 0, 0)
  circle A0 centre (25, -42.5) radius 3.05 construction
  line L0 (-25, 42.5) -> (25, 42.5) construction
  line L1 (25, 42.5) -> (25, -42.5) construction
  line L2 (25, -42.5) -> (-25, -42.5) construction
  line L3 (-25, -42.5) -> (-25, 42.5) construction
  line L4 (-25, 42.5) -> (25, -42.5) construction
  line L5 (25, 42.5) -> (-25, -42.5) construction
  point P0 (0, 0)
extrude "Extrusion11" cut sketch "Sketch1" along normal blind 11 contours A0 | A1
properties part number "SmallTool20mm"
